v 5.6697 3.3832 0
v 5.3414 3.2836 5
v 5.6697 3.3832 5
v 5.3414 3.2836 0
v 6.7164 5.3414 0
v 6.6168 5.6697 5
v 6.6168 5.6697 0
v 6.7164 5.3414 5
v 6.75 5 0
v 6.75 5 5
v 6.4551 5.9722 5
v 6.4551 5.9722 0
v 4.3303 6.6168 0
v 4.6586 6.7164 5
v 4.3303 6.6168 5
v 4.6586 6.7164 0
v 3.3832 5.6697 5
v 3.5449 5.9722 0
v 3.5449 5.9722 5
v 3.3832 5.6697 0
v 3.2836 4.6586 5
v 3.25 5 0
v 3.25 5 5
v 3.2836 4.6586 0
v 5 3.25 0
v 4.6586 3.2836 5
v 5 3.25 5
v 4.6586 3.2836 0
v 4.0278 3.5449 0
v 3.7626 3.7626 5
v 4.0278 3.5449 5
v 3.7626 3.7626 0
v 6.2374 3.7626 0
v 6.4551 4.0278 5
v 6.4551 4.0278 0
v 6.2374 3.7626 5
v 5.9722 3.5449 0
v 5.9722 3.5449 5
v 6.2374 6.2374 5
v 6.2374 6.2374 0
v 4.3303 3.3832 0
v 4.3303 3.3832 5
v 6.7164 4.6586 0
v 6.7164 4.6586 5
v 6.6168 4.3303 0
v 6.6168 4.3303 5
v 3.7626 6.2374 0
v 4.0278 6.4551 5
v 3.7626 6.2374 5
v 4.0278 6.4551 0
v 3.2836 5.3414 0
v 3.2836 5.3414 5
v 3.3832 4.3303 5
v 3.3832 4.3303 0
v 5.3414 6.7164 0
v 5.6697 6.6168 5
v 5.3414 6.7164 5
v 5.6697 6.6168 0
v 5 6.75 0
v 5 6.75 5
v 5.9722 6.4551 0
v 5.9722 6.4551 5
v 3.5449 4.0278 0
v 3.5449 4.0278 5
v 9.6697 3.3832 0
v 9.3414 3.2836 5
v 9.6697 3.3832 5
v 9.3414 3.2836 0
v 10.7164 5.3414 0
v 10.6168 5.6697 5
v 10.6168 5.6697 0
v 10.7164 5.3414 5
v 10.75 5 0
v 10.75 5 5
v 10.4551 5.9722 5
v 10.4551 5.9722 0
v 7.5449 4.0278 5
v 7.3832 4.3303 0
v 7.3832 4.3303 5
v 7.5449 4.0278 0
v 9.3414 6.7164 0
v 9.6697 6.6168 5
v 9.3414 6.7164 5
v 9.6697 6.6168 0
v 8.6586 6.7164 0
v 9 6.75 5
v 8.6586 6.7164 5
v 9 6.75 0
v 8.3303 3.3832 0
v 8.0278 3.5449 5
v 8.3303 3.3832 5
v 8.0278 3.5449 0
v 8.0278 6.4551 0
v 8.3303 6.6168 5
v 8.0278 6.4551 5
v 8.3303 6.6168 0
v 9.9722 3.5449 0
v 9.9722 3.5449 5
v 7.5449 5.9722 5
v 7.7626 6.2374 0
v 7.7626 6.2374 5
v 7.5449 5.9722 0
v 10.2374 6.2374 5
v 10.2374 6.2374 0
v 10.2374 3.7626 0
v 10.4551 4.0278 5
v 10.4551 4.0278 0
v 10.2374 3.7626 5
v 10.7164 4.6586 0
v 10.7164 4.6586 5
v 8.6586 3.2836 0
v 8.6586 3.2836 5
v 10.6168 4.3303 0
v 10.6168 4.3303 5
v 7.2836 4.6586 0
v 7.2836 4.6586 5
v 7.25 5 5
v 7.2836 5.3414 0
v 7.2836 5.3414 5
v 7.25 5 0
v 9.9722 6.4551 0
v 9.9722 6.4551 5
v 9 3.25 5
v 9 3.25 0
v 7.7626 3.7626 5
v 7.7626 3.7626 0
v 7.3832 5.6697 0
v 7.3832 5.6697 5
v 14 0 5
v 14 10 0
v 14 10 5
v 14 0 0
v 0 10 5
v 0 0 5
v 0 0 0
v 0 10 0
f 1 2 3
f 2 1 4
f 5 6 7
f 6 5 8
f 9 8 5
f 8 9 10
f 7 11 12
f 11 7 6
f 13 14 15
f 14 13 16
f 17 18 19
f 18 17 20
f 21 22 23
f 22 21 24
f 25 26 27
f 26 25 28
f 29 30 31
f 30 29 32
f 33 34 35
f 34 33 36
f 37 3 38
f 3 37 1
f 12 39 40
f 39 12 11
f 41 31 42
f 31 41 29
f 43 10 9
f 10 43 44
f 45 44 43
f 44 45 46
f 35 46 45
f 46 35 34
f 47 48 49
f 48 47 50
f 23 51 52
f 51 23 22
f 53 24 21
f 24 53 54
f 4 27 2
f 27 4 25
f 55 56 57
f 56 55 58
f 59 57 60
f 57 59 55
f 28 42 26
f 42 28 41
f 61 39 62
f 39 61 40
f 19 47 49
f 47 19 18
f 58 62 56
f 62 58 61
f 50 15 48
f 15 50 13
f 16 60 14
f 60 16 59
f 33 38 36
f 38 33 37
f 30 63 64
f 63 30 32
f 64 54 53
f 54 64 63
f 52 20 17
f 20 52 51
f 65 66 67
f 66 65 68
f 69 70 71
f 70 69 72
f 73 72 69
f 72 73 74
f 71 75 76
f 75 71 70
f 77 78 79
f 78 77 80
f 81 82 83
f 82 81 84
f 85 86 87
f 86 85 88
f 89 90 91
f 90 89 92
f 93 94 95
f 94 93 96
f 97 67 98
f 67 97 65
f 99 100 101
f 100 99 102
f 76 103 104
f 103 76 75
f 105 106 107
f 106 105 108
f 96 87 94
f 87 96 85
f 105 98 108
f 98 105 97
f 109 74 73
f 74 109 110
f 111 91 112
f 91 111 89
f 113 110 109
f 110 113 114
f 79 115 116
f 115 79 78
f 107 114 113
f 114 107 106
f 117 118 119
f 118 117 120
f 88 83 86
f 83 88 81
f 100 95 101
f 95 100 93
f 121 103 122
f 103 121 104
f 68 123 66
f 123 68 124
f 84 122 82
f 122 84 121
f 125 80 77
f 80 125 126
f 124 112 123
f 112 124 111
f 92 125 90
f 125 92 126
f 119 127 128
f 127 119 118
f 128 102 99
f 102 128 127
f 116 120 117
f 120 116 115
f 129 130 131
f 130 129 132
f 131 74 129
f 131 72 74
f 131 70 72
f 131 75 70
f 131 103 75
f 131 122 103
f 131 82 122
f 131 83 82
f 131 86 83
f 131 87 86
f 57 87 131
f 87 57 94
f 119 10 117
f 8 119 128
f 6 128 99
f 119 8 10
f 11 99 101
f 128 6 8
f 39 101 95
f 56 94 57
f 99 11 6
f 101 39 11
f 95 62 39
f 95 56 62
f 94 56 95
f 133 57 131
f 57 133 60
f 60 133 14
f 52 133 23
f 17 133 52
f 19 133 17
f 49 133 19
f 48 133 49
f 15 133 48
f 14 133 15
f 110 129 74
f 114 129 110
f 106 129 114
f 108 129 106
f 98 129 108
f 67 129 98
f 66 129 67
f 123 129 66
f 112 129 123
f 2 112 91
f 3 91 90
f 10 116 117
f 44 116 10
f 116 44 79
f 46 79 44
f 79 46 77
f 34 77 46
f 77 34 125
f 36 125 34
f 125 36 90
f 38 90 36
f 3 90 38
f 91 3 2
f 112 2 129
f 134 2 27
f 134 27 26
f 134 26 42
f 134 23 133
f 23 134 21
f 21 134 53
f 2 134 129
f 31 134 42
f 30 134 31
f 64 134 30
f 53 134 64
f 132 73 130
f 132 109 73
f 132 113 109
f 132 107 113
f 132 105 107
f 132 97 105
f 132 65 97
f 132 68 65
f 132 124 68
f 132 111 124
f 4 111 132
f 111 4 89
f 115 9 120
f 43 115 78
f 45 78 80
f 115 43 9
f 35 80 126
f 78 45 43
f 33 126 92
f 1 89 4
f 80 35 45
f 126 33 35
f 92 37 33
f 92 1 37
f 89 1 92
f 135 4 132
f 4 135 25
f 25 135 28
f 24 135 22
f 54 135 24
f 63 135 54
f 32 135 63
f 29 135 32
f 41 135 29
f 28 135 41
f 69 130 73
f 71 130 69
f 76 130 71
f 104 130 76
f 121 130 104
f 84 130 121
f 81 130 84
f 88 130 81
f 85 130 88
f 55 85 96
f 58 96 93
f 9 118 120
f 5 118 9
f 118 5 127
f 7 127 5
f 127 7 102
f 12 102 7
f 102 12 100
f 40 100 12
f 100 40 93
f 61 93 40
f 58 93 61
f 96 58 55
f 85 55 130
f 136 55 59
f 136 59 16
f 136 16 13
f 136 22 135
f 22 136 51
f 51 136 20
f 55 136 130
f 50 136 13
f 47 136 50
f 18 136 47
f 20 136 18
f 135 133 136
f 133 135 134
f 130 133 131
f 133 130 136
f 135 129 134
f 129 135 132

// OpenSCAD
$fn = 32;

// ----------------------------------------------------------------------
// Micro pad: two-hole pad, 5-20 mm class
// ----------------------------------------------------------------------

// --- parameters (mm) ---
pad_l = 14;               // pad length, X
pad_w = 10;               // pad width, Y
pad_t = 5;                // pad thickness, Z
hole_d = 3.5;             // hole diameter
hole_x = 5;               // X of the first hole centre

difference() {
  cube([pad_l, pad_w, pad_t]);
  for (x = [hole_x, pad_l - hole_x])
    translate([x, pad_w / 2, -1])
      cylinder(h = pad_t + 2, d = hole_d);
}
